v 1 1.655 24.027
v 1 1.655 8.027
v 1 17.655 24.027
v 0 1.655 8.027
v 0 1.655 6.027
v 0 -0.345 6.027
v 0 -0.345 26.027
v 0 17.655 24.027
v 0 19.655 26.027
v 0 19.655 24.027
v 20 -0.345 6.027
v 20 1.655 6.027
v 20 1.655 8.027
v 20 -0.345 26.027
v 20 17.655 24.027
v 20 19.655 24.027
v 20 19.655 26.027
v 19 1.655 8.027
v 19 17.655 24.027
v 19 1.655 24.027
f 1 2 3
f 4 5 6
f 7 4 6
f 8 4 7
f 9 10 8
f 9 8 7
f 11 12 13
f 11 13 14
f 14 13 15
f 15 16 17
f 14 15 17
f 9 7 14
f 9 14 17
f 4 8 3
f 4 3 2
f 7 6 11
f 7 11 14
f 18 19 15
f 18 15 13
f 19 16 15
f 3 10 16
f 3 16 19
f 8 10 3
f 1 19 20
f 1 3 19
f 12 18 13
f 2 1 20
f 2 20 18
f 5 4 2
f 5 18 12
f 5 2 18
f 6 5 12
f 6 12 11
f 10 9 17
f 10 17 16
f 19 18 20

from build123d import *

# Parameters (mm, degrees)
EXTRUDE_1_DEPTH     = 20
CUT_EXTRUDE_START   = -2
SKETCH_3_W          = 18
SKETCH_3_H          = 16
CUT_EXTRUDE_1_DEPTH = 16


with BuildPart() as part:
    # 草图1 → 凸台-拉伸1 (new body)
    with BuildSketch(Plane(origin=(0, 0, 0), x_dir=(0, 0, -1), z_dir=(1, 0, 0))):
        Polygon((-6.026925143, -0.344583577), (-26.026925143, -0.344583577), (-26.026925143, 19.655416423), (-24.026925143, 19.655416423), (-24.026925143, 17.655416423), (-8.026925143, 1.655416423), (-6.026925143, 1.655416423), align=None)
    extrude(amount=EXTRUDE_1_DEPTH)

    # 草图3 → 切除-拉伸1 (cut)
    with BuildSketch(Plane.XZ.offset(0.344583577).offset(CUT_EXTRUDE_START)):
        with Locations((10, 16.026925143)):
            Rectangle(SKETCH_3_W, SKETCH_3_H)
    extrude(amount=-CUT_EXTRUDE_1_DEPTH, mode=Mode.SUBTRACT)


solid = part.part
